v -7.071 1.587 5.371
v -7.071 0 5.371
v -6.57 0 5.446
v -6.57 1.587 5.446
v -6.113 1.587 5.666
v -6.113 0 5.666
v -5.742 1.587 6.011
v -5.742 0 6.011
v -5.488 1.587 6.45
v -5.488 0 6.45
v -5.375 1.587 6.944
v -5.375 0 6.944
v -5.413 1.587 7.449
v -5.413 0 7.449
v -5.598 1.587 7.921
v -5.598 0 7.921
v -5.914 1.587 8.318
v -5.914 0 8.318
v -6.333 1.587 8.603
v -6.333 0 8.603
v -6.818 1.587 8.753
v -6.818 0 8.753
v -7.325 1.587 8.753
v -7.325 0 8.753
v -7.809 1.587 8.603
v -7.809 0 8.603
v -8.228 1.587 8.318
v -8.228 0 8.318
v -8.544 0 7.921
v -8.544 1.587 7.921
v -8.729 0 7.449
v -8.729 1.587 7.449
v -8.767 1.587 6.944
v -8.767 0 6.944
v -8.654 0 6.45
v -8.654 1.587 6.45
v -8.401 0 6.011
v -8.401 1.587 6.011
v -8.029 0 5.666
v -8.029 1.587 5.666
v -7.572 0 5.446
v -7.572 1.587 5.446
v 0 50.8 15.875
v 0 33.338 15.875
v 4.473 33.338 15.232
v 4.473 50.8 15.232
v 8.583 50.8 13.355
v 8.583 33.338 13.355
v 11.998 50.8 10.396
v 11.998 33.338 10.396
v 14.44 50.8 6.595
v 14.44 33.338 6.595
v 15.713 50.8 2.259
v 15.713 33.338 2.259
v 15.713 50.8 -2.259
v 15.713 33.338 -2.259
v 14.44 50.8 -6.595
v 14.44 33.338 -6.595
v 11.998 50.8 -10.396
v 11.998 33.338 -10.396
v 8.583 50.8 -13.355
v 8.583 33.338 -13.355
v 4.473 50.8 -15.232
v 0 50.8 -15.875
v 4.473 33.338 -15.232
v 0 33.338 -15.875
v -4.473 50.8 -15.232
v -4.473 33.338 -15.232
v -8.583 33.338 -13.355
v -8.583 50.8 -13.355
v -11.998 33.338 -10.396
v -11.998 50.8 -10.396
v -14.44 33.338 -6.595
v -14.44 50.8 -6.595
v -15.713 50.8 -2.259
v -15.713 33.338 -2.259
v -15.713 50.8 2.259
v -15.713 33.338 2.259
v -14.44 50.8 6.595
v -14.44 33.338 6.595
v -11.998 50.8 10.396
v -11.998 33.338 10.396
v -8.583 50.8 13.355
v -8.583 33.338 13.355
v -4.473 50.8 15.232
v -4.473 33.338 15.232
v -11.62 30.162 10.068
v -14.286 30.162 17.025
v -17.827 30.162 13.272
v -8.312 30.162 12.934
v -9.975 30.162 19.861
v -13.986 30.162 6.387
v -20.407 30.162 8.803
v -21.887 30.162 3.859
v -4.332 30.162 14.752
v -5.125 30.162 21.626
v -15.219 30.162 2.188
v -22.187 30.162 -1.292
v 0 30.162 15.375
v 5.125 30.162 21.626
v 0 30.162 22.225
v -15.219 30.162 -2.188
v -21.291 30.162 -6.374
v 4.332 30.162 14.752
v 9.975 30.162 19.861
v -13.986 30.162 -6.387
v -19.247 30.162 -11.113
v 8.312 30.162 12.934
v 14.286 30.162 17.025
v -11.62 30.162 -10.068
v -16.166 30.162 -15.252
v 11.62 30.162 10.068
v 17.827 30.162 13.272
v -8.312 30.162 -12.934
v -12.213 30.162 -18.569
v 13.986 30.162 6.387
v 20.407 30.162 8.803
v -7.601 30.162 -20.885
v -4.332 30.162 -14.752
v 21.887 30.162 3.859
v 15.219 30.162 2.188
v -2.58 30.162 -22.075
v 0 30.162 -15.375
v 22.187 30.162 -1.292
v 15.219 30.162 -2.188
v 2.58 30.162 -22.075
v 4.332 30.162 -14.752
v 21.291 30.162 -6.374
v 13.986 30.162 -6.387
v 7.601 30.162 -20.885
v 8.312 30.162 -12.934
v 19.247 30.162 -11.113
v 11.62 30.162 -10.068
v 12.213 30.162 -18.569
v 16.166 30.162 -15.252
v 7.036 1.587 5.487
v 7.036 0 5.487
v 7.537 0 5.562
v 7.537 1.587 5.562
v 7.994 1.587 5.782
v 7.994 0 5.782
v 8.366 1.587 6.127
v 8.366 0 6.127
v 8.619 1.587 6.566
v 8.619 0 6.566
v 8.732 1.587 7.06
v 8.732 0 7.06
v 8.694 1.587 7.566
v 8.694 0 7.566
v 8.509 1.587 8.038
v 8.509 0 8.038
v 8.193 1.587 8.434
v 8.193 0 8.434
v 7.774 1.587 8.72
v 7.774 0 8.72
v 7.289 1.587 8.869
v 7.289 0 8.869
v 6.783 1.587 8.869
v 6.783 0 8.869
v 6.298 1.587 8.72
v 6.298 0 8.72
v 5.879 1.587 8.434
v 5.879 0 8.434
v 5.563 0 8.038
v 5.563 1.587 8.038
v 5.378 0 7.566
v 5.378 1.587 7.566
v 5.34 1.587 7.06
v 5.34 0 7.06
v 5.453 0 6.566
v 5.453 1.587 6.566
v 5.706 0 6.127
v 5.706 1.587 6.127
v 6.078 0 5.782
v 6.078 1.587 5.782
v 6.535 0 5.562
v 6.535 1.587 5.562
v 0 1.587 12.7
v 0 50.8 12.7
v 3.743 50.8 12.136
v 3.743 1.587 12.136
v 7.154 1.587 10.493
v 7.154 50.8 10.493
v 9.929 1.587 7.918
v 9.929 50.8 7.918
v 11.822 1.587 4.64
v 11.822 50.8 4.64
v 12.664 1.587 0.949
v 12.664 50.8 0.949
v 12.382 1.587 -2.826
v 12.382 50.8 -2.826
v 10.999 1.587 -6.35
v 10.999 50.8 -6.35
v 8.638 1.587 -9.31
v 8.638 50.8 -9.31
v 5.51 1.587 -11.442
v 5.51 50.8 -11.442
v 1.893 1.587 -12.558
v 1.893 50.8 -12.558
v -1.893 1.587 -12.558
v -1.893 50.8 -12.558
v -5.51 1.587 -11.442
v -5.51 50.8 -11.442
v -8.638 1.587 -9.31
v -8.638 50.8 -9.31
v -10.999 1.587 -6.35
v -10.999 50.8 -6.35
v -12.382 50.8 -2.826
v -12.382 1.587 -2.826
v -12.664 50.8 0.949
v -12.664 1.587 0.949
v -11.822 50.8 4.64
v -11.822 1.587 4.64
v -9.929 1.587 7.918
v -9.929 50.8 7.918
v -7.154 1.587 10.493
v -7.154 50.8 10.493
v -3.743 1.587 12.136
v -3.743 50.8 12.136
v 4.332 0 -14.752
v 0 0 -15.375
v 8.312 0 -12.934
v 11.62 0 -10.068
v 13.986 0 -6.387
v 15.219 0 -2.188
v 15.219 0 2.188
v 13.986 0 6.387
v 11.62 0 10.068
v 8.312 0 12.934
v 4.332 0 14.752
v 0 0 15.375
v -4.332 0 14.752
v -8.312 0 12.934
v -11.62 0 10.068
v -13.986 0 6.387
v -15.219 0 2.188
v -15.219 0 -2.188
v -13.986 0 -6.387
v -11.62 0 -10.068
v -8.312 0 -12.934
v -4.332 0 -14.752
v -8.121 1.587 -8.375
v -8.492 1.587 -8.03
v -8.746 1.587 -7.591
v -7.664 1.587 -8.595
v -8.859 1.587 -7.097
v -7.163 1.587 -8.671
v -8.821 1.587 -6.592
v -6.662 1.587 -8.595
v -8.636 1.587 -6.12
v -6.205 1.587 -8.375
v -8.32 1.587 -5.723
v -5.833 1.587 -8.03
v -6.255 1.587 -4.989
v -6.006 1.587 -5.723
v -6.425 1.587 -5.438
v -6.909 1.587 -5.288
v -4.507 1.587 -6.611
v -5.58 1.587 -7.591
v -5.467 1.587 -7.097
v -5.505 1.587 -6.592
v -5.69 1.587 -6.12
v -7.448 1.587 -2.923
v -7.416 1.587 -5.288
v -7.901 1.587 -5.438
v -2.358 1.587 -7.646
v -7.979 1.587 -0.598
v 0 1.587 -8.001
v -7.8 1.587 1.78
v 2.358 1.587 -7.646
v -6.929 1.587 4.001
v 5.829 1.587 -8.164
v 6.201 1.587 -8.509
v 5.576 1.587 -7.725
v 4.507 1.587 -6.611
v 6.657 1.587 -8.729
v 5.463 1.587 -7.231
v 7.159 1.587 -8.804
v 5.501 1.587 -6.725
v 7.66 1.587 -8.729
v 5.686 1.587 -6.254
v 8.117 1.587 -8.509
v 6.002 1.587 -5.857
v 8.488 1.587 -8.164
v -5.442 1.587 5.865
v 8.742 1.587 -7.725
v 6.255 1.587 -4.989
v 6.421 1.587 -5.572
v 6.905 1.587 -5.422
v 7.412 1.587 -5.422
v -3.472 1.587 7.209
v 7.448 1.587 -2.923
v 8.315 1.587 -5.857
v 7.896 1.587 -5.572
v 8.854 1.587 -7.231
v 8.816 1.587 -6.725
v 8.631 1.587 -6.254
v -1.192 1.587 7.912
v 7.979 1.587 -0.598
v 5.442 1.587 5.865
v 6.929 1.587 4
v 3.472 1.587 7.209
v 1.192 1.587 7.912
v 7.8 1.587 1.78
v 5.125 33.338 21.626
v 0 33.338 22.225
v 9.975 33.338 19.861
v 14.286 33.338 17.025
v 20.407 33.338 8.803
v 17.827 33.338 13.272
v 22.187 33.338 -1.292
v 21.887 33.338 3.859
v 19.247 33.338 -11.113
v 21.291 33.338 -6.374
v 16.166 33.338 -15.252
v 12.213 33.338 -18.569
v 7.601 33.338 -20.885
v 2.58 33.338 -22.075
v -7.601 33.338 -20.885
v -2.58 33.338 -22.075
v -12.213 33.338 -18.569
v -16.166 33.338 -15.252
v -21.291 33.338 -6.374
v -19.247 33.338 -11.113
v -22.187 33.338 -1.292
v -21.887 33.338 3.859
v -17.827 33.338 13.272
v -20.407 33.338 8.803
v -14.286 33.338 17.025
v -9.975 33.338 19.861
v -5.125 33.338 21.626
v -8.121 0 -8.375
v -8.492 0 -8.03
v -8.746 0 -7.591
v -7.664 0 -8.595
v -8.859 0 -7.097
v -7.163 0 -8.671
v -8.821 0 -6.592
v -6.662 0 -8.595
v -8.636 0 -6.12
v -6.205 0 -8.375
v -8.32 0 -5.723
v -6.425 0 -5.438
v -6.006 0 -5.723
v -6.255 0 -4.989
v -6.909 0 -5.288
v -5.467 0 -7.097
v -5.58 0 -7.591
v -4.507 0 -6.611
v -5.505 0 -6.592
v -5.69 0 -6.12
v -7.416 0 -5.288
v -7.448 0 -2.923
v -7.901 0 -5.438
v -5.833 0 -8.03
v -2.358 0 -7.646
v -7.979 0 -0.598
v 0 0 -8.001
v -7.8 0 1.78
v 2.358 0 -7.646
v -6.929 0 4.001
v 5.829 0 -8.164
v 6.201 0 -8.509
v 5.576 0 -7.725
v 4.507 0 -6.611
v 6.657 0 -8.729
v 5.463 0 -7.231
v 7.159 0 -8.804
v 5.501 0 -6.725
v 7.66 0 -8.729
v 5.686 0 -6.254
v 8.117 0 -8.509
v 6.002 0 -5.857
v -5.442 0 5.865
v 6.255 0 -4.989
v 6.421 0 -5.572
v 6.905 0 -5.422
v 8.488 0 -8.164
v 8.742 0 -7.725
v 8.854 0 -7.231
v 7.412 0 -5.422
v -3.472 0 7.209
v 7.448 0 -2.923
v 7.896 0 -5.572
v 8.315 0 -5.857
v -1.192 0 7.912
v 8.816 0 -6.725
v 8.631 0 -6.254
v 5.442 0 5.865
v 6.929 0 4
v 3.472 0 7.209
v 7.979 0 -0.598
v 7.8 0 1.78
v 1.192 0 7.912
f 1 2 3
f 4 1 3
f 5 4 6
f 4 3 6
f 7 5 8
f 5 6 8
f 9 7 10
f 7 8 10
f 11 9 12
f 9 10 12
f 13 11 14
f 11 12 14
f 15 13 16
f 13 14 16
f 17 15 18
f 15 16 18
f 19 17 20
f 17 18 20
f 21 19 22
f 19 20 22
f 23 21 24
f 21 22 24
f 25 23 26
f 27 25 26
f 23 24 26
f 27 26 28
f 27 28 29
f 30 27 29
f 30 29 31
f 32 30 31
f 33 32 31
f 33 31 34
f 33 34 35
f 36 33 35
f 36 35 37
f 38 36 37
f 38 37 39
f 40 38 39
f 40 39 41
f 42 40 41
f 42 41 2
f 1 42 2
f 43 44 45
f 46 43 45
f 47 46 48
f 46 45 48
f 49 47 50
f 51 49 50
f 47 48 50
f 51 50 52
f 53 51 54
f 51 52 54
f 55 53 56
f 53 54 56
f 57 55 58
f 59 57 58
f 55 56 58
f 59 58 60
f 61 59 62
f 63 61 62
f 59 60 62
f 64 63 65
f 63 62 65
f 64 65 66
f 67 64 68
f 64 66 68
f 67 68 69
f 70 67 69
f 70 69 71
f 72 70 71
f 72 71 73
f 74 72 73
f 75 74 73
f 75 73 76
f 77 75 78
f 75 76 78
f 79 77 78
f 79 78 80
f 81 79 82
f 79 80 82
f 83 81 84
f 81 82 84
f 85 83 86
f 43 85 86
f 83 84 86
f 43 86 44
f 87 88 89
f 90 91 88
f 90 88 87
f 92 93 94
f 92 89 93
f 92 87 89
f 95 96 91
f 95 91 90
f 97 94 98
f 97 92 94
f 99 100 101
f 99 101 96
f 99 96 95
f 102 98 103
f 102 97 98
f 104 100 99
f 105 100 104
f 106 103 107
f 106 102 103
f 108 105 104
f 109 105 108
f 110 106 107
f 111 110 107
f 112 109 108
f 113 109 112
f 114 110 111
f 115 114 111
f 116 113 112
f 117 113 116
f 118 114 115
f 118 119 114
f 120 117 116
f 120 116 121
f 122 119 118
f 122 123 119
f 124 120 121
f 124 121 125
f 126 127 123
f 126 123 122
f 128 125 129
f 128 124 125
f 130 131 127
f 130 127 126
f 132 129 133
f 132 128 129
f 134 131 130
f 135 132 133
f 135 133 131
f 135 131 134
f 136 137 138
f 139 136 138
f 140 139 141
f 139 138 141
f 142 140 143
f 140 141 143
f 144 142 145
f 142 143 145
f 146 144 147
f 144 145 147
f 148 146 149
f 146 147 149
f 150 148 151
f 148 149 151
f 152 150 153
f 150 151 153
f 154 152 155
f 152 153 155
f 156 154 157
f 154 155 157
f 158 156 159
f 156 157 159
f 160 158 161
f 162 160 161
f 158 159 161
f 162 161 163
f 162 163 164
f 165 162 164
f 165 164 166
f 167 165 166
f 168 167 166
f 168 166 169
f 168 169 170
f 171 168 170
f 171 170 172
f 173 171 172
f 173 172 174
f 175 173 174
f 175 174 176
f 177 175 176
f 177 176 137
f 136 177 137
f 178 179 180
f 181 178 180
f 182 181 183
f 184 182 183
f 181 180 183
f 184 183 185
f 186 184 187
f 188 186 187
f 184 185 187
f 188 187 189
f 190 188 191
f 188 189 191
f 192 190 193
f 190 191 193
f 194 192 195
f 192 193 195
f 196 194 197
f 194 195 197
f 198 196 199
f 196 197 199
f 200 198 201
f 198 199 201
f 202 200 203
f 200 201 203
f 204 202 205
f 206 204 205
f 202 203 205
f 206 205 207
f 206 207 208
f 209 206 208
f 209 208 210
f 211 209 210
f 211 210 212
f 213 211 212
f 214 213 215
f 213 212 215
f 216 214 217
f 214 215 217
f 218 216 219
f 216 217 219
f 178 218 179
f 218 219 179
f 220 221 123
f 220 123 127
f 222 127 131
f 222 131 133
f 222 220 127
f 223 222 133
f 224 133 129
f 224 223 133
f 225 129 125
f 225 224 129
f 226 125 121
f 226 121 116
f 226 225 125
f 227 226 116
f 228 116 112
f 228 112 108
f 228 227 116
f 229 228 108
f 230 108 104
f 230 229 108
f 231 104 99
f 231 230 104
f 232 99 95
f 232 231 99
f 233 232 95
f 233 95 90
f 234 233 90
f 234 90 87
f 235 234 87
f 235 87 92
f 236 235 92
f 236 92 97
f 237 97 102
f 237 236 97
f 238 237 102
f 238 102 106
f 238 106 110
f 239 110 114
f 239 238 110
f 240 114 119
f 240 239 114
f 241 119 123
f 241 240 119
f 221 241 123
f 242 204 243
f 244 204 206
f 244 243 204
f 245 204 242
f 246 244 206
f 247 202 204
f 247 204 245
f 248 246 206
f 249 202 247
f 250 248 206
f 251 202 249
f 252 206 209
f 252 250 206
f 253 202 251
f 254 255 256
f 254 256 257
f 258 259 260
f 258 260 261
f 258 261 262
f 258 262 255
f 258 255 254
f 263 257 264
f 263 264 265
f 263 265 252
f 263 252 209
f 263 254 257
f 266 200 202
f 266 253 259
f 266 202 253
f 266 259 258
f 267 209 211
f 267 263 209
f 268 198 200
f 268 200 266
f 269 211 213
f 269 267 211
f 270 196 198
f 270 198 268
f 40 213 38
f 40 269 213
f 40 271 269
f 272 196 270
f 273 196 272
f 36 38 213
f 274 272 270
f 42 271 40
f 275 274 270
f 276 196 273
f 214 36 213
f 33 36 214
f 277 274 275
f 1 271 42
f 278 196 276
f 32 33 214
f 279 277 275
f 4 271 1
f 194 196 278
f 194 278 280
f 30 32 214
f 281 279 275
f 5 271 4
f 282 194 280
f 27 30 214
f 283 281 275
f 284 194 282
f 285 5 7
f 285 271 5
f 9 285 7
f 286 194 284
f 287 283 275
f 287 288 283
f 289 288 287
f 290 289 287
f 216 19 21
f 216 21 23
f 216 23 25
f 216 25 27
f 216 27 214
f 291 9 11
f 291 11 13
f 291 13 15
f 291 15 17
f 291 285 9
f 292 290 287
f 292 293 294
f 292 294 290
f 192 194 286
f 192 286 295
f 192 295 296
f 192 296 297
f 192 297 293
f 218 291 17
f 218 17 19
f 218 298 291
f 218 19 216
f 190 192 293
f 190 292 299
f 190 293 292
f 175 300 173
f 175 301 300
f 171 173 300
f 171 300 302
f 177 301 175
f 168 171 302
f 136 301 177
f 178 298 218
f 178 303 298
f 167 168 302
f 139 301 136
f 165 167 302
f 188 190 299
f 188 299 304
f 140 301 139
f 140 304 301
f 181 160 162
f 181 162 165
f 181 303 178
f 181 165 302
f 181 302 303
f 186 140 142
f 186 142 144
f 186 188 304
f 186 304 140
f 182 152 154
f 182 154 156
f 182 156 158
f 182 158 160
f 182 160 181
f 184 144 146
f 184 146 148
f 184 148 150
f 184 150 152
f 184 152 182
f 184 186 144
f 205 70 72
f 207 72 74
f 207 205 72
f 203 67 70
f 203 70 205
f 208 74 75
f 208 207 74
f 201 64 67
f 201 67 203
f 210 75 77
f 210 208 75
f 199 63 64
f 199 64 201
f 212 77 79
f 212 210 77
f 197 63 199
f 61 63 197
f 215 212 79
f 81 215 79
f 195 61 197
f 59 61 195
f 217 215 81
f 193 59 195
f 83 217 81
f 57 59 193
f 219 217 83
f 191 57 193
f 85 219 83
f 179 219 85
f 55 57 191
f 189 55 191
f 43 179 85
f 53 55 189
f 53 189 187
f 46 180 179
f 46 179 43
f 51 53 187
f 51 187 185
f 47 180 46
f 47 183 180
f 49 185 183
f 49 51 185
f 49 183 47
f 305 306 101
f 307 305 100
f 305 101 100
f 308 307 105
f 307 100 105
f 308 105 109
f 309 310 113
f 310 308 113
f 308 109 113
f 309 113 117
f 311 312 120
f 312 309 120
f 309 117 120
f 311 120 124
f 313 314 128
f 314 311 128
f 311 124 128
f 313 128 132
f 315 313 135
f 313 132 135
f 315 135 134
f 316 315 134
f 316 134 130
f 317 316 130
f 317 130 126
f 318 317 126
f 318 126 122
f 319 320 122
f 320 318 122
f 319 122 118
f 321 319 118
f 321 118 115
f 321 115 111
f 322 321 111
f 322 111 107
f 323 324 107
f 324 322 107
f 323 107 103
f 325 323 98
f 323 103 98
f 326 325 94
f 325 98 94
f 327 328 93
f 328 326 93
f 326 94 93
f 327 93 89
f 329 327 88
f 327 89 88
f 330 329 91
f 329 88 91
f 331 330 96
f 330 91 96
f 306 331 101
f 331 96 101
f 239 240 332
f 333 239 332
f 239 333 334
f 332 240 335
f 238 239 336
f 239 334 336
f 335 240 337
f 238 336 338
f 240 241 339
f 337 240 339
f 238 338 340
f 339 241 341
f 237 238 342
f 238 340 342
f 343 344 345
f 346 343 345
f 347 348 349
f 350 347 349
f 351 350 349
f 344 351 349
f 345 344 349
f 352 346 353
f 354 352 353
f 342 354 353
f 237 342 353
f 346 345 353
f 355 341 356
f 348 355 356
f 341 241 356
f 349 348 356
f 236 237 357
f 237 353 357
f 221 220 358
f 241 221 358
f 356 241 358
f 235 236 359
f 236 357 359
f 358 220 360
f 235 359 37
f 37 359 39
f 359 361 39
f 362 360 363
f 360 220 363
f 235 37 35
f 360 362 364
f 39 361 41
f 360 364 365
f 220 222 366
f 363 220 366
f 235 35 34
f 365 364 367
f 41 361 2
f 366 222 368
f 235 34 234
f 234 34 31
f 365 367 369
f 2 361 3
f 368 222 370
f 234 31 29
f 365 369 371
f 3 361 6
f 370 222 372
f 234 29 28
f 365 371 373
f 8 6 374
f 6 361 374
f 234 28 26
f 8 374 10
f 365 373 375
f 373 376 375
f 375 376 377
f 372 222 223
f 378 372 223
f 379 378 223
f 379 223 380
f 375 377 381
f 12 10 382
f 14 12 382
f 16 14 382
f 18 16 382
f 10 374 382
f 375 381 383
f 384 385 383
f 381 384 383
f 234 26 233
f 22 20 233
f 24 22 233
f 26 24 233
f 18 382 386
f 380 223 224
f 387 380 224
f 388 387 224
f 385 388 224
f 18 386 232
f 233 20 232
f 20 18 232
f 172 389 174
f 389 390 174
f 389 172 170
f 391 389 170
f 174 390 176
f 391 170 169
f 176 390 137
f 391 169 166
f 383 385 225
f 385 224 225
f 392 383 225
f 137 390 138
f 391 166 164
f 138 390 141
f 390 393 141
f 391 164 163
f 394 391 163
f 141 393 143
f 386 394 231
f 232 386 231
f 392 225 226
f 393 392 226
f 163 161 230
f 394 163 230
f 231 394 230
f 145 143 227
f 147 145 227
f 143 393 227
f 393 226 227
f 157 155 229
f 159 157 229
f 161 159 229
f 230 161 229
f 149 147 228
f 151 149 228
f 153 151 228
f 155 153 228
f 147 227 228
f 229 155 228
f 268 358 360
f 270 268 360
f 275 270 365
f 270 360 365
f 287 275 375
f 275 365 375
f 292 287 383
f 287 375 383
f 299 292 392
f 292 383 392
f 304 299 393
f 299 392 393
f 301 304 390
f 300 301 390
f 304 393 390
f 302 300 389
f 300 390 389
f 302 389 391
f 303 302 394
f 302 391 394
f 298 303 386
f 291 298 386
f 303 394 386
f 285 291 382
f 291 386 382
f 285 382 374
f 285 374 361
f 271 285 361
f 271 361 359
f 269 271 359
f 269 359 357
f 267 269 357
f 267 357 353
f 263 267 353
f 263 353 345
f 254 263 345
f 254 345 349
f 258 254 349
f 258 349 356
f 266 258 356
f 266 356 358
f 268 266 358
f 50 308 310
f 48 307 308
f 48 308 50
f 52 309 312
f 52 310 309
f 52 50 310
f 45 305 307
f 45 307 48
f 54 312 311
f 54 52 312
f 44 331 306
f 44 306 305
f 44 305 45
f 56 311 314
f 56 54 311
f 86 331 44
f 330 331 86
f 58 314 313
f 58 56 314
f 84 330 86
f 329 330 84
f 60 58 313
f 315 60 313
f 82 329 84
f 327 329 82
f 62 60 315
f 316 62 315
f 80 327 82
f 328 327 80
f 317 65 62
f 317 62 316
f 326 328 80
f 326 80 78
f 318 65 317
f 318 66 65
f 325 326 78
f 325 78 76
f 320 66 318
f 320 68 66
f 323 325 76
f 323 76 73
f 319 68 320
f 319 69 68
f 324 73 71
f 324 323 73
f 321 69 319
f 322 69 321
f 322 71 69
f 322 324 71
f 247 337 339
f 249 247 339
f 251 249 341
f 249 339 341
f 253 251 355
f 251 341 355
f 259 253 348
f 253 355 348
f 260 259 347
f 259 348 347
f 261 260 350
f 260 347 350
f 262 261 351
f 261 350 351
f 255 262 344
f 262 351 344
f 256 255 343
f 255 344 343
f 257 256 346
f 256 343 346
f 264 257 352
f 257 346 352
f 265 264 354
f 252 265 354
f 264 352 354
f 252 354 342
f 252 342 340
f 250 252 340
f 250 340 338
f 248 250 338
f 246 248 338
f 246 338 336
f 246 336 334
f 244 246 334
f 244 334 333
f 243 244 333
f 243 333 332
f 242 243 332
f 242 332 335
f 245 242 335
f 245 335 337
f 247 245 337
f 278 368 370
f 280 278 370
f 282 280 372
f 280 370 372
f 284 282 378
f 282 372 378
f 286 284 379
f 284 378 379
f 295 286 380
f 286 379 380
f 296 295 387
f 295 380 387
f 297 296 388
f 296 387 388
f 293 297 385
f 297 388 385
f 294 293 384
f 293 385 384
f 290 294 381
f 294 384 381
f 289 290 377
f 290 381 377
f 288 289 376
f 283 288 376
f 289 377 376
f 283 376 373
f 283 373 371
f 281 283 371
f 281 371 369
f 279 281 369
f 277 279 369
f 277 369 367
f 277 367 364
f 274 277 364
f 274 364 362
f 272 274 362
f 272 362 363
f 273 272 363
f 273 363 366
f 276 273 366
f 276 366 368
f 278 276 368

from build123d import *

# Parameters (mm, degrees)
SKETCH1_R             = 22.225
BOSS_EXTRUDE1_DEPTH   = 50.8
SKETCH2_R             = 22.225
SKETCH2_R_2           = 15.375
CUT_EXTRUDE1_DEPTH    = 30.1625
SKETCH3_R             = 12.7
CUT_EXTRUDE2_DEPTH    = 49.2125
CUT_EXTRUDE3_START    = -17.4625
SKETCH5_R             = 22.225
SKETCH5_R_2           = 15.875
CUT_EXTRUDE3_DEPTH    = 17.4625
SKETCH6_R             = 8.001
SKETCH6_R_2           = 1.70053
MOTORINTERFACFE_DEPTH = 60.737268518


with BuildPart() as part:
    # Sketch1 → Boss-Extrude1 (new body)
    with BuildSketch(Plane(origin=(0, 0, 0), x_dir=(1, 0, 0), z_dir=(0, 1, 0))):
        with Locations(Location((0, 0, 0), (0, 0, 270))):
            Circle(SKETCH1_R)
    extrude(amount=BOSS_EXTRUDE1_DEPTH)

    # Sketch2 → Cut-Extrude1 (cut)
    with BuildSketch(Plane.XZ):
        with Locations(Location((0, 0, 0), (0, 0, 270))):
            Circle(SKETCH2_R)
        with Locations(Location((0, 0, 0), (0, 0, 270))):
            Circle(SKETCH2_R_2, mode=Mode.SUBTRACT)
    extrude(amount=-CUT_EXTRUDE1_DEPTH, mode=Mode.SUBTRACT)

    # Sketch3 → Cut-Extrude2 (cut)
    with BuildSketch(Plane(origin=(0, 50.8, 0), x_dir=(1, 0, 0), z_dir=(0, 1, 0))):
        with Locations(Location((0, 0, 0), (0, 0, 270))):
            Circle(SKETCH3_R)
    extrude(amount=-CUT_EXTRUDE2_DEPTH, mode=Mode.SUBTRACT)

    # Sketch5 → Cut-Extrude3 (cut)
    with BuildSketch(Plane(origin=(0, 50.8, 0), x_dir=(1, 0, 0), z_dir=(0, 1, 0)).offset(CUT_EXTRUDE3_START)):
        with Locations(Location((0, 0, 0), (0, 0, 90))):
            Circle(SKETCH5_R)
        with Locations(Location((0, 0, 0), (0, 0, 270))):
            Circle(SKETCH5_R_2, mode=Mode.SUBTRACT)
    extrude(amount=CUT_EXTRUDE3_DEPTH, mode=Mode.SUBTRACT)

    # Sketch6 → MotorInterfacfe (cut, through all)
    with BuildSketch(Plane.XZ):
        with Locations(Location((0, 0, 0), (0, 0, 270))):
            Circle(SKETCH6_R)
        with Locations(Location((-7.07105367, 7.07105367, 0), (0, 0, 270))):
            Circle(SKETCH6_R_2)
        with Locations(Location((-7.162899066, -6.970031681, 0), (0, 0, 270))):
            Circle(SKETCH6_R_2)
        with Locations(Location((7.158557907, -7.103864696, 0), (0, 0, 270))):
            Circle(SKETCH6_R_2)
        with Locations(Location((7.036006619, 7.187404798, 0), (0, 0, 270))):
            Circle(SKETCH6_R_2)
    extrude(amount=-MOTORINTERFACFE_DEPTH, mode=Mode.SUBTRACT)


solid = part.part
